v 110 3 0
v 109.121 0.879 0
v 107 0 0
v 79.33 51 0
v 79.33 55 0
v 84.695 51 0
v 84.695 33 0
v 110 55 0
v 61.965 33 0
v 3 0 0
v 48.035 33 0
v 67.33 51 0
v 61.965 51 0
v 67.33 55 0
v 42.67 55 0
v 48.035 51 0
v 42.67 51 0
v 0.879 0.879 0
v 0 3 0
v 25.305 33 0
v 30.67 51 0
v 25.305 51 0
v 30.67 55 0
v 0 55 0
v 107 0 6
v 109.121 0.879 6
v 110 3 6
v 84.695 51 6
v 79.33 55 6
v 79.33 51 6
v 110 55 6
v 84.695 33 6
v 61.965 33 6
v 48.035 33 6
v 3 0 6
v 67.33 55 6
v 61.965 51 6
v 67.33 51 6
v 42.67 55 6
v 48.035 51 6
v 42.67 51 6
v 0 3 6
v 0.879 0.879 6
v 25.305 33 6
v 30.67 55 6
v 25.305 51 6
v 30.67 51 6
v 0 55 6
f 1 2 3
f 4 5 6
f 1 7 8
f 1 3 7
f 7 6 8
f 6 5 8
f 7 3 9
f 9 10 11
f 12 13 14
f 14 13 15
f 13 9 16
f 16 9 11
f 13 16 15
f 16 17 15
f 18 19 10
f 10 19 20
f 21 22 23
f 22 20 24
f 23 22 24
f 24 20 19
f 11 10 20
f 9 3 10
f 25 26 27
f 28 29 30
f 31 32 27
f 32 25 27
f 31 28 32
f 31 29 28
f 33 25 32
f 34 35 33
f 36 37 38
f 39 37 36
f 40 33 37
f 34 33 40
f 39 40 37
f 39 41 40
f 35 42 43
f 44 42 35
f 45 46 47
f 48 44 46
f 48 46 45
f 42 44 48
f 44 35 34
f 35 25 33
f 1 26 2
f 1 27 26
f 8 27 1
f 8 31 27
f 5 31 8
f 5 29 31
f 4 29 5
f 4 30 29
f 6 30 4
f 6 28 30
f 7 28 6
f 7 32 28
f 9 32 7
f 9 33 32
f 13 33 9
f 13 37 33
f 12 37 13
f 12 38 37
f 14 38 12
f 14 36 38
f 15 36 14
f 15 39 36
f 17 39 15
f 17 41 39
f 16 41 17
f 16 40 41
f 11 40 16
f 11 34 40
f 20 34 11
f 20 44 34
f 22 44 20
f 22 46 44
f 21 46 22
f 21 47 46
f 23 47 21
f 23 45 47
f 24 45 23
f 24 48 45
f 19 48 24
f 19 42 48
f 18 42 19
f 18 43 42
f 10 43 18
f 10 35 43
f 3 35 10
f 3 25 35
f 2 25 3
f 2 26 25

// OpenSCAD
$fn = 32;

// ----------------------------------------------------------------------
// Window plate: 110 x 55 mm, 2 open windows
// ----------------------------------------------------------------------

// --- parameters (mm) ---
profile_height = 6;       // extrusion height
profile_points = 24;      // points of the closed outline

profile = [[0, 3], [0.879, 0.879], [3, 0], [107, 0], [109.121, 0.879], [110, 3], [110, 55], [79.33, 55], [79.33, 51], [84.695, 51], [84.695, 33], [61.965, 33], [61.965, 51], [67.33, 51], [67.33, 55], [42.67, 55], [42.67, 51], [48.035, 51], [48.035, 33], [25.305, 33], [25.305, 51], [30.67, 51], [30.67, 55], [0, 55]];  // single closed polygon, 24 points, counter clockwise

// --- the one profile operation ---
linear_extrude(height = profile_height) polygon(points = profile);
